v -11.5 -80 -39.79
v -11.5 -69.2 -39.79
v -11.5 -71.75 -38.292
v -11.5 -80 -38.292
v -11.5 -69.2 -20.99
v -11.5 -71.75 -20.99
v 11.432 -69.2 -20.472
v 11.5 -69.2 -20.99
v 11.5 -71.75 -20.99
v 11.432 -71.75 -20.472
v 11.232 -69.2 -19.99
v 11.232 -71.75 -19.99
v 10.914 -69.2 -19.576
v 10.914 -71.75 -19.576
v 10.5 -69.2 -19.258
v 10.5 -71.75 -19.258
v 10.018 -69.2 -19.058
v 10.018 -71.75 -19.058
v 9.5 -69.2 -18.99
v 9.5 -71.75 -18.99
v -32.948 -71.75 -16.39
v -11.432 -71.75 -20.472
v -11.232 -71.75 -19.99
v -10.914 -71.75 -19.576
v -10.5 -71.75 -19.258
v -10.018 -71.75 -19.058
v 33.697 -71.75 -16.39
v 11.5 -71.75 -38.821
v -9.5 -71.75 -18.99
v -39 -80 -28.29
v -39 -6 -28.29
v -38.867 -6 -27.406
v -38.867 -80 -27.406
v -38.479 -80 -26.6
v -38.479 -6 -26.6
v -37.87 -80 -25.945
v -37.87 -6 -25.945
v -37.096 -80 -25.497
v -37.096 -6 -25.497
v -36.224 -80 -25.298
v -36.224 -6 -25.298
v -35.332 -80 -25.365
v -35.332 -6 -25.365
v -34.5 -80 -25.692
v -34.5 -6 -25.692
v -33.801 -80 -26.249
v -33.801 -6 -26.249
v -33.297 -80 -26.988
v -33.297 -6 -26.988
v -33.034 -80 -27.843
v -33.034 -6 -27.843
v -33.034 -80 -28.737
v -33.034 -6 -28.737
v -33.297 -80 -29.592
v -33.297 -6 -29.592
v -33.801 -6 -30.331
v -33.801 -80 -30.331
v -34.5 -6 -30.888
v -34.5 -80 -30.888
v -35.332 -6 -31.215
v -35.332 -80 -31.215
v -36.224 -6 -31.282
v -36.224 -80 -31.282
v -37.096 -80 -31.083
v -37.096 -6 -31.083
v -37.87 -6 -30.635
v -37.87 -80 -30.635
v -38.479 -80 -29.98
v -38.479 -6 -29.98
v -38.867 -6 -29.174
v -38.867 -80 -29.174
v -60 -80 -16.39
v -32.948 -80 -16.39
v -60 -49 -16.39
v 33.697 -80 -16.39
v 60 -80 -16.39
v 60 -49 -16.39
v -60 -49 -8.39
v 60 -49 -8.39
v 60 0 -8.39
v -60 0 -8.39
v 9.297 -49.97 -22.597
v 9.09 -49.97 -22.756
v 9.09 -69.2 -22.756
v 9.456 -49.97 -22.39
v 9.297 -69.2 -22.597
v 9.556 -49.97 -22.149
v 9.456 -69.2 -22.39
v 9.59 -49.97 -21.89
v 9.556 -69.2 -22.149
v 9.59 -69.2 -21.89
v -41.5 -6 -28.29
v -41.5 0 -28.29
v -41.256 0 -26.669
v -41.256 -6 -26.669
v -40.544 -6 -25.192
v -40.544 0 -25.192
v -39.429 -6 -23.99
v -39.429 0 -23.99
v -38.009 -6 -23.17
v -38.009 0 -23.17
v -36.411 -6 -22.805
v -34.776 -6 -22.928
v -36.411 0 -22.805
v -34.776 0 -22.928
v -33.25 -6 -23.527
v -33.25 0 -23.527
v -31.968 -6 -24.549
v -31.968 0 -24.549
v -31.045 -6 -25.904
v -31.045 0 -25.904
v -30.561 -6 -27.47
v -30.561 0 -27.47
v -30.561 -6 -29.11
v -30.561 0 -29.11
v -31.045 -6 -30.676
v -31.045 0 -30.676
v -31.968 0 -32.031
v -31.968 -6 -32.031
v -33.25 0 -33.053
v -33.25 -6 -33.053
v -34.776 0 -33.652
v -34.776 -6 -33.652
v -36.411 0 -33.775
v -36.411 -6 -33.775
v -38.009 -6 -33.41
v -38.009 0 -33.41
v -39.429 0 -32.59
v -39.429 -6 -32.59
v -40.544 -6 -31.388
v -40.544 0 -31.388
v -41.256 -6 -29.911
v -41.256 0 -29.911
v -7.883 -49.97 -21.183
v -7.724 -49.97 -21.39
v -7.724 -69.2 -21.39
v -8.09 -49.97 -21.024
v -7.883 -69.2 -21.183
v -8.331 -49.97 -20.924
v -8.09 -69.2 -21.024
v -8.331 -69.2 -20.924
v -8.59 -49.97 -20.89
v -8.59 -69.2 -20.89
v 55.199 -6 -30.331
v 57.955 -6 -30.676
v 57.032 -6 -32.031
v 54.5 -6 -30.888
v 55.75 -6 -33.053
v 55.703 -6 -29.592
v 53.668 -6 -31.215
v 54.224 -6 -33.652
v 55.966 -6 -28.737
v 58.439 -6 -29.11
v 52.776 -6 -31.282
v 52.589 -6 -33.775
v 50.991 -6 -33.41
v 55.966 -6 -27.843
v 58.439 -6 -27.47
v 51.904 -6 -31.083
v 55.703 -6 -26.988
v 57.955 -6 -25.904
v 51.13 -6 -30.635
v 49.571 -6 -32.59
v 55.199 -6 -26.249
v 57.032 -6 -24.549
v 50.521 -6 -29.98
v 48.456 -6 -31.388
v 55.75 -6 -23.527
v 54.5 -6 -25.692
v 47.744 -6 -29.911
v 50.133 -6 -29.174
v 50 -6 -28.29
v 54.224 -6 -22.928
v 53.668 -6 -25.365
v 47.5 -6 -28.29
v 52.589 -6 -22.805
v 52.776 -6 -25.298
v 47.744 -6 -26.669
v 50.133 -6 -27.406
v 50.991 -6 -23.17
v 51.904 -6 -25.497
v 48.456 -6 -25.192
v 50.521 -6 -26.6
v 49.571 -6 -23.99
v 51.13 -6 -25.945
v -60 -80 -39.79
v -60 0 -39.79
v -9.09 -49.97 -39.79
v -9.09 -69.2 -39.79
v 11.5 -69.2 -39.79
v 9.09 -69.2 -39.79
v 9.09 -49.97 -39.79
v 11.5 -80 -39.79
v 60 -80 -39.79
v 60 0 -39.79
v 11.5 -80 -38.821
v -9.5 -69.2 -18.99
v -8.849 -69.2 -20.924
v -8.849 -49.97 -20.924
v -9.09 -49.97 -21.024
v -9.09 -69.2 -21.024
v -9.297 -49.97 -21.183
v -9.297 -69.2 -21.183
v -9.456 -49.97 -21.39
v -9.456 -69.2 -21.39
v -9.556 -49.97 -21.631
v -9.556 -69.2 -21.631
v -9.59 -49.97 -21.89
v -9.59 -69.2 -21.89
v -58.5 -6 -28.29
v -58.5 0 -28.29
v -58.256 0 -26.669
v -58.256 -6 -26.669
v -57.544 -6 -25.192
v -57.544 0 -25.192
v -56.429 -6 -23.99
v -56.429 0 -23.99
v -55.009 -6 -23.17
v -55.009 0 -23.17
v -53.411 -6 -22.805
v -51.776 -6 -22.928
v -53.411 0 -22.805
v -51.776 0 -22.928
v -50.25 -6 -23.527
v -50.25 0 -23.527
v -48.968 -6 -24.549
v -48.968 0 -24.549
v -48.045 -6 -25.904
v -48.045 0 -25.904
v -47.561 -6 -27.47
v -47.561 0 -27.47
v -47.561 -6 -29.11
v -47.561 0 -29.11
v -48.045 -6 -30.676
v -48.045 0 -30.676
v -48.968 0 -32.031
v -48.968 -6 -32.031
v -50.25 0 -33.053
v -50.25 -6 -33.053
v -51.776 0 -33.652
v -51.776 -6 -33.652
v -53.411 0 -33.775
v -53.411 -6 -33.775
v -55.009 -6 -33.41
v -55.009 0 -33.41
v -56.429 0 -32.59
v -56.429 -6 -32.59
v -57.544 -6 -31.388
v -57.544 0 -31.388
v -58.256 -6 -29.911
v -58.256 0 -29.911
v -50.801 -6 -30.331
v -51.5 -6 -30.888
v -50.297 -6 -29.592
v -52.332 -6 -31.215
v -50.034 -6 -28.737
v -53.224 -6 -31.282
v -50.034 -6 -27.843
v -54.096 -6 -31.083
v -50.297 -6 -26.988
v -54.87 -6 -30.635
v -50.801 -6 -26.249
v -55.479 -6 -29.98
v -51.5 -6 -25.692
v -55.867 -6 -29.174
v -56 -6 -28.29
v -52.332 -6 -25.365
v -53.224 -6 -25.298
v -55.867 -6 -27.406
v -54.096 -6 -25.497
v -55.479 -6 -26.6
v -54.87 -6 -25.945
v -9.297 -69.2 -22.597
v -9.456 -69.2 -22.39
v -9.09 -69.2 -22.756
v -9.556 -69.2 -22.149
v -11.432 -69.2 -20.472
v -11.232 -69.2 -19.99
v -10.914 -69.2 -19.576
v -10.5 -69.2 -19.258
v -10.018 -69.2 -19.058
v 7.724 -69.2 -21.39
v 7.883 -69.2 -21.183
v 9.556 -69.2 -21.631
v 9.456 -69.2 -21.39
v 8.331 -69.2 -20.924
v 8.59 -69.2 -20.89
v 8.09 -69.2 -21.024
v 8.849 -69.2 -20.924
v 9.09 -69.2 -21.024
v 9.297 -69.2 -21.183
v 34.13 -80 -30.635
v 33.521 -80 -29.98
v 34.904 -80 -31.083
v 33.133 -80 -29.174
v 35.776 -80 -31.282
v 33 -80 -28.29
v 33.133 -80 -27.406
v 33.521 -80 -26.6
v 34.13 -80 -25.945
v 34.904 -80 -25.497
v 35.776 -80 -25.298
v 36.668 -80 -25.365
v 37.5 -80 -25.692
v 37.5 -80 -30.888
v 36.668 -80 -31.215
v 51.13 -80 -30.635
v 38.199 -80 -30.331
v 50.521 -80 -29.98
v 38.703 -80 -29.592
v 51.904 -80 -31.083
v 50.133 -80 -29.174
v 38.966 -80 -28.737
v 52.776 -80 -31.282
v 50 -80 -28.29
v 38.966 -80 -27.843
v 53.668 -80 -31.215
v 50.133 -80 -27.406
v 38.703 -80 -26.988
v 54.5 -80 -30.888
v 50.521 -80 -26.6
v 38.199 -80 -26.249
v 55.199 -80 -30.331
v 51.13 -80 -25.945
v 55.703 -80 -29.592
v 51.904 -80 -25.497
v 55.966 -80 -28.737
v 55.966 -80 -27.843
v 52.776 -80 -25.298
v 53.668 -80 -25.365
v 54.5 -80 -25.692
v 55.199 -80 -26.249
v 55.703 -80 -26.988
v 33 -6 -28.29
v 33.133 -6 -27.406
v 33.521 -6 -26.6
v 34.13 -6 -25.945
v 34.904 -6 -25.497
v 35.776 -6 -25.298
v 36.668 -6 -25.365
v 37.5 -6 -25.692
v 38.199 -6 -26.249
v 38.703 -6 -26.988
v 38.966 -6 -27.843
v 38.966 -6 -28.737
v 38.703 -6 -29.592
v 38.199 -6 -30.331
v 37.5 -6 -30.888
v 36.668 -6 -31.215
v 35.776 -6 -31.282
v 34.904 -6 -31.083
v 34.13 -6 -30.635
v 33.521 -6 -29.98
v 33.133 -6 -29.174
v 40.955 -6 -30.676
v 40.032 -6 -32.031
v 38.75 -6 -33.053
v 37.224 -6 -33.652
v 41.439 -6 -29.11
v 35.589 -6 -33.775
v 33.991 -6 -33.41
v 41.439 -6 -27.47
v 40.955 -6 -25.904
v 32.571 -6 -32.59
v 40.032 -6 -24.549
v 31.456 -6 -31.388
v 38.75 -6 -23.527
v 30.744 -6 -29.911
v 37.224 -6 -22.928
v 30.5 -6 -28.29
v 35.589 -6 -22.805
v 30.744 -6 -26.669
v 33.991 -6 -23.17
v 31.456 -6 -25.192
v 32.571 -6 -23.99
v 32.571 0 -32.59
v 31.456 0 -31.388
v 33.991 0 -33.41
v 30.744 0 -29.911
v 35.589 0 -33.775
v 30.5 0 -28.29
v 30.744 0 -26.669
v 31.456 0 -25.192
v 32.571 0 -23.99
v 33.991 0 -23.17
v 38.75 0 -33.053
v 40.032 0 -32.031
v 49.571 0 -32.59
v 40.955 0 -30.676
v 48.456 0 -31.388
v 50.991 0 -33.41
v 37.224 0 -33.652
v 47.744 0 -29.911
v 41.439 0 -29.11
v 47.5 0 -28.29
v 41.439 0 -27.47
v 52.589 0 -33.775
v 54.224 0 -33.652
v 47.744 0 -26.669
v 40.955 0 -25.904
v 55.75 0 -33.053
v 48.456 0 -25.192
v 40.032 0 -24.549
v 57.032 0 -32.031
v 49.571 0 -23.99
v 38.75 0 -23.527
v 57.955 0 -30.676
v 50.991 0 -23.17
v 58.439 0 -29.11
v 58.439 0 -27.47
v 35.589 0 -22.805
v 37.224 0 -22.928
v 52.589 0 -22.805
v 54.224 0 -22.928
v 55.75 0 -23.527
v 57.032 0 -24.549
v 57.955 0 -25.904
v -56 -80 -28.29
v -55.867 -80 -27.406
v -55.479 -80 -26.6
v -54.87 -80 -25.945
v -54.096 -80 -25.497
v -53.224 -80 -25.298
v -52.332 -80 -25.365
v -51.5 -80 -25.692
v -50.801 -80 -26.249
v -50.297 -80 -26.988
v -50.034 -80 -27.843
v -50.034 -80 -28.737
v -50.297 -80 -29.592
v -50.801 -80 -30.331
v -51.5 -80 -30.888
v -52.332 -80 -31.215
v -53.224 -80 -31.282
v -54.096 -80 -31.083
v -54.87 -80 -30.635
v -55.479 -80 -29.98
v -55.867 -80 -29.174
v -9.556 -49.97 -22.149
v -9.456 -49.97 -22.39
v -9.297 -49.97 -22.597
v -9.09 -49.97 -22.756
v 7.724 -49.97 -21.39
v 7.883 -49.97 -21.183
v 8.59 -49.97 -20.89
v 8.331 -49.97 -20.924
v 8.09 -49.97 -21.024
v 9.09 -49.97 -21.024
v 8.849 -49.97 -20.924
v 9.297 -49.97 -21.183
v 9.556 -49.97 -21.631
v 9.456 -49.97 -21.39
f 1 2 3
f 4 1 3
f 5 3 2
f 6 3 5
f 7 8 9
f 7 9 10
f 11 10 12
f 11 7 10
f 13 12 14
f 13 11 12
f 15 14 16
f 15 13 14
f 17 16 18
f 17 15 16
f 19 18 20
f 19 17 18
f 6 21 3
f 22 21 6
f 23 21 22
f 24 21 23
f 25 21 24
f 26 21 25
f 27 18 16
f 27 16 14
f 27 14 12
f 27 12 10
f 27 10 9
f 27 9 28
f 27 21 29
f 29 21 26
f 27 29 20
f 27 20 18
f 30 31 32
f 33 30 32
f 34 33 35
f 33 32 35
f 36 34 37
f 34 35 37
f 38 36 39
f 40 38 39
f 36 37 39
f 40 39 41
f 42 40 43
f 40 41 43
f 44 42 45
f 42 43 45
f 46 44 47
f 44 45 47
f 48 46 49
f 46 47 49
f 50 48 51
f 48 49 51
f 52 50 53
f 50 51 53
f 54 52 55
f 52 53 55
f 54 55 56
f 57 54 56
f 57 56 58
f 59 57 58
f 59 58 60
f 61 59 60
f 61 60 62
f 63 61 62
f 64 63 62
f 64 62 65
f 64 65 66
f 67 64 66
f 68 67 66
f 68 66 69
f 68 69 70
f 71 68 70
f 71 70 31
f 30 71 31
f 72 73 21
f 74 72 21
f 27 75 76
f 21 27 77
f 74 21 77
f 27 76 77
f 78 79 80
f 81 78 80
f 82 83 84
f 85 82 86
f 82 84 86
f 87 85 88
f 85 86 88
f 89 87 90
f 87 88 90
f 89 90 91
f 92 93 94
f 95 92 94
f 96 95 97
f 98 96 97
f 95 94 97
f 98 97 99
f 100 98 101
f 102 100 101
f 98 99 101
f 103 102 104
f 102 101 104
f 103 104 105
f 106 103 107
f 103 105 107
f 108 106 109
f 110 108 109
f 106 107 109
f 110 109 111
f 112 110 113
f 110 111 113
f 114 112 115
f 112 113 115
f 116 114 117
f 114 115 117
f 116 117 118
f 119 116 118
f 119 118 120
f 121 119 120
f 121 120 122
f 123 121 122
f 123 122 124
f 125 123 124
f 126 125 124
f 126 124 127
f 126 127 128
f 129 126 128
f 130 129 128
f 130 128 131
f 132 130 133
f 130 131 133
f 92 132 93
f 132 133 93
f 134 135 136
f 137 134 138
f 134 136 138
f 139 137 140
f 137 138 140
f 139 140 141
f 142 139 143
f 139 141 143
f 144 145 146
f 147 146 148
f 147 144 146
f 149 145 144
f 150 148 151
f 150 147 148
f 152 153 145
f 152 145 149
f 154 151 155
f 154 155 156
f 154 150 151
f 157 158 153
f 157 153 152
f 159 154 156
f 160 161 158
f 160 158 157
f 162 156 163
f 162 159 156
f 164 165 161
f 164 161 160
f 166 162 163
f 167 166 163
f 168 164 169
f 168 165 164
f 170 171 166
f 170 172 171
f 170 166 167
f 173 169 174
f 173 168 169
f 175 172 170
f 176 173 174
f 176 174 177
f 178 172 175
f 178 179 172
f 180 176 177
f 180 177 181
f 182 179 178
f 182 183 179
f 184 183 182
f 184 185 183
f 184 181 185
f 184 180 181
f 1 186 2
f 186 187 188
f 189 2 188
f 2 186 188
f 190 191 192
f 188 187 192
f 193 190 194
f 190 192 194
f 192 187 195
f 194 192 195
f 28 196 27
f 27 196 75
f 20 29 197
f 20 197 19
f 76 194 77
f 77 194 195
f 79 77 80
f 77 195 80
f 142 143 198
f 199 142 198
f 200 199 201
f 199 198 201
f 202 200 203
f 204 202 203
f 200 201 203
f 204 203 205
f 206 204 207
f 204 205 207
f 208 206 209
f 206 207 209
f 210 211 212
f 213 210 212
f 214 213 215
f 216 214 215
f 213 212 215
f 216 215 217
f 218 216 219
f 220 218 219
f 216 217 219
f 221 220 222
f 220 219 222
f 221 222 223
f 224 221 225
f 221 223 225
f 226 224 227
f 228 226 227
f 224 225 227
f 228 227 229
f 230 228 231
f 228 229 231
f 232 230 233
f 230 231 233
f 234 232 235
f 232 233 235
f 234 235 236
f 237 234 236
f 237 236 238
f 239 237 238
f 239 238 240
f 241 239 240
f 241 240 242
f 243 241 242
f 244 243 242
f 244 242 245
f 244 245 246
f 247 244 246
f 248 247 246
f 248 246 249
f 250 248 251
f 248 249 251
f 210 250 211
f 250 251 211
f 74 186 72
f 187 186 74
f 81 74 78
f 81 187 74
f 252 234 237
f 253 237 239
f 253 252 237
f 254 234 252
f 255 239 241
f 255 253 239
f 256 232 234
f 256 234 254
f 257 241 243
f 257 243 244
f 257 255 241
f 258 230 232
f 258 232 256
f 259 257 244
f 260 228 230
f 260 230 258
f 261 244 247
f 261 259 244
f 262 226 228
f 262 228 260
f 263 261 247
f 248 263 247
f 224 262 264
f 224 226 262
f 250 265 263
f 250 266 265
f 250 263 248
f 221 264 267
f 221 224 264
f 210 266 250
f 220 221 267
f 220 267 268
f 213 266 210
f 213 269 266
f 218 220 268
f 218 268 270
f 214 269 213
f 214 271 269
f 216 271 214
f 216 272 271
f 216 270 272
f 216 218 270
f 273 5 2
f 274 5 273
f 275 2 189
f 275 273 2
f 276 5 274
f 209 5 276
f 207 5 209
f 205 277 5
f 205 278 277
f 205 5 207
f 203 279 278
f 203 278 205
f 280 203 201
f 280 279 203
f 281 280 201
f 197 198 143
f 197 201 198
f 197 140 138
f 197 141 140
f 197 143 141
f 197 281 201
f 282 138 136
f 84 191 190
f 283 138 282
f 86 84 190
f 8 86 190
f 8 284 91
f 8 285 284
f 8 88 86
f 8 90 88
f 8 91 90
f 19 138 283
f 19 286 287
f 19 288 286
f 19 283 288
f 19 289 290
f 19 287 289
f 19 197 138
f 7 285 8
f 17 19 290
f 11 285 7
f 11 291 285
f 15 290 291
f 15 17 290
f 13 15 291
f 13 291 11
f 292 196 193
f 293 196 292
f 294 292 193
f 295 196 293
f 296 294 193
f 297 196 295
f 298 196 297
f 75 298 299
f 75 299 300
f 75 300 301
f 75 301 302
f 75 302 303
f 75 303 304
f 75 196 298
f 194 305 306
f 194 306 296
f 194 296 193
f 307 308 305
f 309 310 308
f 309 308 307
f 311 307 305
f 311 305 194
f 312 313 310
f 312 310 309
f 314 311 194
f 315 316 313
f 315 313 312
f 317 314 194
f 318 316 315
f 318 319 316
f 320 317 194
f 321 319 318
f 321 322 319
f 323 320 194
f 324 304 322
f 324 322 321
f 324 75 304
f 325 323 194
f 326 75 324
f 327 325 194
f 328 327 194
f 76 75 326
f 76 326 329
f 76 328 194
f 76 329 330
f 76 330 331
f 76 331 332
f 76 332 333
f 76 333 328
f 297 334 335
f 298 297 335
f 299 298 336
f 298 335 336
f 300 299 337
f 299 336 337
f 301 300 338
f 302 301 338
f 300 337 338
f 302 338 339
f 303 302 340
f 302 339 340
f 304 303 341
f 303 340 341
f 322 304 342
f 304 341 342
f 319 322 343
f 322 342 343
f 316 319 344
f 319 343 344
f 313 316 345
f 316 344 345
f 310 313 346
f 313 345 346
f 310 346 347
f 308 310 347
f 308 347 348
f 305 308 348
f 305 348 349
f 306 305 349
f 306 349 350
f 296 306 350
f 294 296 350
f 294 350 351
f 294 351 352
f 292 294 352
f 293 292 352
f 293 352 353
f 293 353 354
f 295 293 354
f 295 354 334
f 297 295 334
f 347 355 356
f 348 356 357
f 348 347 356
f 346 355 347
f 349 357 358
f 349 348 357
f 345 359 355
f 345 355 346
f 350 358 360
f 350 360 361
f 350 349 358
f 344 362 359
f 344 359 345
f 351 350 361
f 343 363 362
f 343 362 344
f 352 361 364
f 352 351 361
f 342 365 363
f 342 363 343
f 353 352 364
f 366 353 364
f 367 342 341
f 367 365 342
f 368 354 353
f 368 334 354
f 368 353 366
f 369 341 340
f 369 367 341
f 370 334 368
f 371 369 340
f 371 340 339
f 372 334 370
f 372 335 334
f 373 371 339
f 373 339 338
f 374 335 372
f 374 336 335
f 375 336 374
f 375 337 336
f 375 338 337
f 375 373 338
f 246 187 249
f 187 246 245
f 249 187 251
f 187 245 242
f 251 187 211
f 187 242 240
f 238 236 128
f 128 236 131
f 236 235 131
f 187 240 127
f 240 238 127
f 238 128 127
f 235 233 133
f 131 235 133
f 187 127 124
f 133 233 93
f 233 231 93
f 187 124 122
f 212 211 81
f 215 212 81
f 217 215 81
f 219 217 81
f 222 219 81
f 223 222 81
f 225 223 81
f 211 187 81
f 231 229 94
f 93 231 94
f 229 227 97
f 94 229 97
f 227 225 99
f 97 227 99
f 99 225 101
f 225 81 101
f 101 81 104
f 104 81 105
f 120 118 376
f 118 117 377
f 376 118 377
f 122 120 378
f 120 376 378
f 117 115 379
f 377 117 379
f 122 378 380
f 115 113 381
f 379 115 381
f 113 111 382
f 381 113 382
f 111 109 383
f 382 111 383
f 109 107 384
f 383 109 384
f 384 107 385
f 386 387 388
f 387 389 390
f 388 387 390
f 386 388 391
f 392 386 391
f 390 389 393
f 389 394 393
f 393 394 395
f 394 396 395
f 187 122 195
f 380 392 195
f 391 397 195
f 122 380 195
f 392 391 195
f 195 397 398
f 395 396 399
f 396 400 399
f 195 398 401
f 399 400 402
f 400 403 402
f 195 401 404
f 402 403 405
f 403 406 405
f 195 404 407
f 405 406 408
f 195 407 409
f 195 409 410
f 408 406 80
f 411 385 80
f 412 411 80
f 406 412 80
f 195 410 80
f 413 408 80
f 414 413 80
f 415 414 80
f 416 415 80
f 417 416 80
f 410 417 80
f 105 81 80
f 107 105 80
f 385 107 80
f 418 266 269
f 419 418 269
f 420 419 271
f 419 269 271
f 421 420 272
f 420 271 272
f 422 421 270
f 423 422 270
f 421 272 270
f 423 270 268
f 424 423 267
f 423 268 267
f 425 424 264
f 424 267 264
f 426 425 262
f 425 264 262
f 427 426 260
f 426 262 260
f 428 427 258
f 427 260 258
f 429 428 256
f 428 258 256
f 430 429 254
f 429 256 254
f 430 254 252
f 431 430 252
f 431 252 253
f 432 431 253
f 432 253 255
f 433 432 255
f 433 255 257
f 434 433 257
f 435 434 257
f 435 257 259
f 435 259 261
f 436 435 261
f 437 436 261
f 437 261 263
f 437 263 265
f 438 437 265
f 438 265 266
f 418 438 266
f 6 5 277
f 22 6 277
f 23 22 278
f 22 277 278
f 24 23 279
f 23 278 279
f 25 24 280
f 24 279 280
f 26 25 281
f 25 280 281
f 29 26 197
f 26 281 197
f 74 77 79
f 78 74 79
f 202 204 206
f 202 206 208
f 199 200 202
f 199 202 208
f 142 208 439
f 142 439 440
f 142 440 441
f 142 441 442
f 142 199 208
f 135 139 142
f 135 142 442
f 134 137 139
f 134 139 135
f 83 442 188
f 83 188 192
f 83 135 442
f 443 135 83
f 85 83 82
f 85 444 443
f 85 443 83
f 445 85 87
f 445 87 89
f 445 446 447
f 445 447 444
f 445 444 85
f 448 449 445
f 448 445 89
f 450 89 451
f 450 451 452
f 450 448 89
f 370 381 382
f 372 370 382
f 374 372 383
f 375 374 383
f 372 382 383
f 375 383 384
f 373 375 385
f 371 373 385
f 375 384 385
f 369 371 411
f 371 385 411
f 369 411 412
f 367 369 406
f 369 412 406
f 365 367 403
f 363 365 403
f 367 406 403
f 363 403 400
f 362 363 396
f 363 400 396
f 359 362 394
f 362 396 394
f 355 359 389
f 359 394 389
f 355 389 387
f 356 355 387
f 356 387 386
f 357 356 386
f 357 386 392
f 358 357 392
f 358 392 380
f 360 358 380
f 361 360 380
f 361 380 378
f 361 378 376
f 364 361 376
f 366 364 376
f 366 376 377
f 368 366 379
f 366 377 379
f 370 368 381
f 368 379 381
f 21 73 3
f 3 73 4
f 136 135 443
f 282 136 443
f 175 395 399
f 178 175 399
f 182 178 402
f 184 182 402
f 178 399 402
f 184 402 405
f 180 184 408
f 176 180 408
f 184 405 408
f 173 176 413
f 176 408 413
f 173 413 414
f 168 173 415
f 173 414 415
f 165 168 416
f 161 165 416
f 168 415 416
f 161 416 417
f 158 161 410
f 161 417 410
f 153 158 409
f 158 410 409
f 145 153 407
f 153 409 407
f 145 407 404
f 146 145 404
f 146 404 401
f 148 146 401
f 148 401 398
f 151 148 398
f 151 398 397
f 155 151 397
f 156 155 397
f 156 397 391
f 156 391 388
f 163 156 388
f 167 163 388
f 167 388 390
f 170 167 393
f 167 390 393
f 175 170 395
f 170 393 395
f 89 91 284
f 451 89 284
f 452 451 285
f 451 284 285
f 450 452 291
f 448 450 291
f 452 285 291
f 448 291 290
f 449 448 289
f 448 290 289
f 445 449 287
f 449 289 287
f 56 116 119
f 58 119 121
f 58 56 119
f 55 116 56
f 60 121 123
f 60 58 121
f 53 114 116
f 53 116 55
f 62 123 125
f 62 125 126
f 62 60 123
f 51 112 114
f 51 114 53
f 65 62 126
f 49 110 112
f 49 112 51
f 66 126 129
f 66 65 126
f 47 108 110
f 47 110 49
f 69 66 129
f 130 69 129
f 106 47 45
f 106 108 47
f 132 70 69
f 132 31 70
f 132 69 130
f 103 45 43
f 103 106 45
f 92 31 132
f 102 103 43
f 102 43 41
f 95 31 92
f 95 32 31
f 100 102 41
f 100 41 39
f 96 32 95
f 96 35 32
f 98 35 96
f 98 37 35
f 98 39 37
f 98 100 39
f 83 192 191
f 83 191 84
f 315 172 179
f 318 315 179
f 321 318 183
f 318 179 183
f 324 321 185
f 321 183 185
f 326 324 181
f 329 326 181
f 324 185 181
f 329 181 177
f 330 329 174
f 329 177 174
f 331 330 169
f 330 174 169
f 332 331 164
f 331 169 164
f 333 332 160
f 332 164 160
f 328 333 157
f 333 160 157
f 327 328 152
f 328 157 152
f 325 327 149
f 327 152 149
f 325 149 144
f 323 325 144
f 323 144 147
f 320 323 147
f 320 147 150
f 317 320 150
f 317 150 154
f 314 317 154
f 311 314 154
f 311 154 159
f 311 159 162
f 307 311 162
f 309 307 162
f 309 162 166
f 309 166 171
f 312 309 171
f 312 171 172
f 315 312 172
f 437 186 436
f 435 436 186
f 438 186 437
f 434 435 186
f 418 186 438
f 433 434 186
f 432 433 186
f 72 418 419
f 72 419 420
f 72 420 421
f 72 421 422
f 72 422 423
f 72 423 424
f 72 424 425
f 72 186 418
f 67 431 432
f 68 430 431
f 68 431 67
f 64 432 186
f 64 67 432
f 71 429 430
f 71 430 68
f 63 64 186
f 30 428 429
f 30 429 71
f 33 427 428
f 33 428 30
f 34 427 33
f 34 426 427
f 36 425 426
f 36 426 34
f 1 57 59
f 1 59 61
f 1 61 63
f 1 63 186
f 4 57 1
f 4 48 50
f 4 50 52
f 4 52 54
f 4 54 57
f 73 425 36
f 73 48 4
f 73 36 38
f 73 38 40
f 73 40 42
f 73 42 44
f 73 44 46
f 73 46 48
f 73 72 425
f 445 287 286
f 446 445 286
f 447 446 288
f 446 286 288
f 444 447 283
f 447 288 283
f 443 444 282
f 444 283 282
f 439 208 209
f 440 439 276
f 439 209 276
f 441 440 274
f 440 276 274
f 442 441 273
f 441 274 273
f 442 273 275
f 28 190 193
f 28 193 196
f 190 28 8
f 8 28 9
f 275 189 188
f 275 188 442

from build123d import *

# Parameters (mm, degrees)
F0_W      = 120
F0_H      = 39.79
F1_DEPTH  = 80
F2_W      = 18.18
F2_H      = 18.4
F3_DEPTH  = 30.03
F4_W      = 23
F4_H      = 20.8
F5_DEPTH  = 10.8
F7_DEPTH  = 19.23
F8_R      = 2
F10_DEPTH = 8.25
F12_DEPTH = 120.001
F13_R     = 3
F14_DEPTH = 80.001
F15_R     = 5.5
F15_R_2   = 3
F16_DEPTH = 6


with BuildPart() as f1:
    # F0 (on Front) → F1 (new body)
    with BuildSketch(Plane.XZ):
        with Locations((0, -19.895)):
            Rectangle(F0_W, F0_H)
    extrude(amount=F1_DEPTH)

    # F2 (on face) → F3 (cut)
    with BuildSketch(Plane.XZ.offset(80)):
        with Locations((0, -30.59)):
            Rectangle(F2_W, F2_H)
    extrude(amount=-F3_DEPTH, mode=Mode.SUBTRACT)

    # F4 (on face) → F5 (cut)
    with BuildSketch(Plane.XZ.offset(80)):
        with Locations((0, -29.39)):
            Rectangle(F4_W, F4_H)
    extrude(amount=-F5_DEPTH, mode=Mode.SUBTRACT)

    # F6 (on face) → F7 (cut, through all)
    with BuildSketch(Plane.XZ.offset(69.2)):
        with BuildLine():
            ThreePointArc((-8.59, -20.89), (-9.297107, -21.182893), (-9.59, -21.89))
            ThreePointArc((-9.59, -21.89), (-8.59, -22.89), (-7.59, -21.89))
            ThreePointArc((-7.59, -21.89), (-7.882893, -21.182893), (-8.59, -20.89))
        make_face()
        with BuildLine():
            ThreePointArc((9.59, -21.89), (9.297107, -21.182893), (8.59, -20.89))
            ThreePointArc((8.59, -20.89), (7.882893, -22.597107), (9.59, -21.89))
        make_face()
    extrude(amount=-F7_DEPTH, mode=Mode.SUBTRACT)

    # F8
    f8_edges = [f1.edges().sort_by_distance(p)[0] for p in [
        (-11.5, -74.6, -18.99),
        (11.5, -74.6, -18.99),
    ]]
    fillet(f8_edges, radius=F8_R)

    # F9 (on face) → F10 (cut)
    with BuildSketch(Plane.XZ.offset(80)):
        Polygon((0.2, 0), (-48.998643, 0), (-10.033396, -39.79), (0.2, -39.79), align=None)
        Polygon((49.916624, 0), (0.2, 0), (0.2, -39.79), (10.541137, -39.79), align=None)
    extrude(amount=-F10_DEPTH, mode=Mode.SUBTRACT)

    # F11 (on face) → F12 (cut, through all)
    with BuildSketch(Plane.YZ.offset(60)):
        Polygon((-49, -8.39), (0, -8.39), (0, 0), (-80, 0), (-80, -16.39), (-49, -16.39), align=None)
    extrude(amount=-F12_DEPTH, mode=Mode.SUBTRACT)

    # F13 (on face) → F14 (cut, through all)
    with BuildSketch(Plane(origin=(0, 0, 0), x_dir=(-1, 0, 0), z_dir=(0, 1, 0))):
        with Locations((-53, -28.29)):
            Circle(F13_R)
        with Locations((-36, -28.29)):
            Circle(F13_R)
        with Locations((36, -28.29)):
            Circle(F13_R)
        with Locations((53, -28.29)):
            Circle(F13_R)
    extrude(amount=-F14_DEPTH, mode=Mode.SUBTRACT)

    # F15 (on face) → F16 (cut)
    with BuildSketch(Plane(origin=(0, 0, 0), x_dir=(-1, 0, 0), z_dir=(0, 1, 0))):
        with Locations((-53, -28.29)):
            Circle(F15_R)
        with Locations((-53, -28.29)):
            Circle(F15_R_2, mode=Mode.SUBTRACT)
        with Locations((-36, -28.29)):
            Circle(F15_R)
        with Locations((-36, -28.29)):
            Circle(F15_R_2, mode=Mode.SUBTRACT)
        with Locations((36, -28.29)):
            Circle(F15_R)
        with Locations((36, -28.29)):
            Circle(F15_R_2, mode=Mode.SUBTRACT)
        with Locations((53, -28.29)):
            Circle(F15_R)
        with Locations((53, -28.29)):
            Circle(F15_R_2, mode=Mode.SUBTRACT)
    extrude(amount=-F16_DEPTH, mode=Mode.SUBTRACT)


solid = f1.part
